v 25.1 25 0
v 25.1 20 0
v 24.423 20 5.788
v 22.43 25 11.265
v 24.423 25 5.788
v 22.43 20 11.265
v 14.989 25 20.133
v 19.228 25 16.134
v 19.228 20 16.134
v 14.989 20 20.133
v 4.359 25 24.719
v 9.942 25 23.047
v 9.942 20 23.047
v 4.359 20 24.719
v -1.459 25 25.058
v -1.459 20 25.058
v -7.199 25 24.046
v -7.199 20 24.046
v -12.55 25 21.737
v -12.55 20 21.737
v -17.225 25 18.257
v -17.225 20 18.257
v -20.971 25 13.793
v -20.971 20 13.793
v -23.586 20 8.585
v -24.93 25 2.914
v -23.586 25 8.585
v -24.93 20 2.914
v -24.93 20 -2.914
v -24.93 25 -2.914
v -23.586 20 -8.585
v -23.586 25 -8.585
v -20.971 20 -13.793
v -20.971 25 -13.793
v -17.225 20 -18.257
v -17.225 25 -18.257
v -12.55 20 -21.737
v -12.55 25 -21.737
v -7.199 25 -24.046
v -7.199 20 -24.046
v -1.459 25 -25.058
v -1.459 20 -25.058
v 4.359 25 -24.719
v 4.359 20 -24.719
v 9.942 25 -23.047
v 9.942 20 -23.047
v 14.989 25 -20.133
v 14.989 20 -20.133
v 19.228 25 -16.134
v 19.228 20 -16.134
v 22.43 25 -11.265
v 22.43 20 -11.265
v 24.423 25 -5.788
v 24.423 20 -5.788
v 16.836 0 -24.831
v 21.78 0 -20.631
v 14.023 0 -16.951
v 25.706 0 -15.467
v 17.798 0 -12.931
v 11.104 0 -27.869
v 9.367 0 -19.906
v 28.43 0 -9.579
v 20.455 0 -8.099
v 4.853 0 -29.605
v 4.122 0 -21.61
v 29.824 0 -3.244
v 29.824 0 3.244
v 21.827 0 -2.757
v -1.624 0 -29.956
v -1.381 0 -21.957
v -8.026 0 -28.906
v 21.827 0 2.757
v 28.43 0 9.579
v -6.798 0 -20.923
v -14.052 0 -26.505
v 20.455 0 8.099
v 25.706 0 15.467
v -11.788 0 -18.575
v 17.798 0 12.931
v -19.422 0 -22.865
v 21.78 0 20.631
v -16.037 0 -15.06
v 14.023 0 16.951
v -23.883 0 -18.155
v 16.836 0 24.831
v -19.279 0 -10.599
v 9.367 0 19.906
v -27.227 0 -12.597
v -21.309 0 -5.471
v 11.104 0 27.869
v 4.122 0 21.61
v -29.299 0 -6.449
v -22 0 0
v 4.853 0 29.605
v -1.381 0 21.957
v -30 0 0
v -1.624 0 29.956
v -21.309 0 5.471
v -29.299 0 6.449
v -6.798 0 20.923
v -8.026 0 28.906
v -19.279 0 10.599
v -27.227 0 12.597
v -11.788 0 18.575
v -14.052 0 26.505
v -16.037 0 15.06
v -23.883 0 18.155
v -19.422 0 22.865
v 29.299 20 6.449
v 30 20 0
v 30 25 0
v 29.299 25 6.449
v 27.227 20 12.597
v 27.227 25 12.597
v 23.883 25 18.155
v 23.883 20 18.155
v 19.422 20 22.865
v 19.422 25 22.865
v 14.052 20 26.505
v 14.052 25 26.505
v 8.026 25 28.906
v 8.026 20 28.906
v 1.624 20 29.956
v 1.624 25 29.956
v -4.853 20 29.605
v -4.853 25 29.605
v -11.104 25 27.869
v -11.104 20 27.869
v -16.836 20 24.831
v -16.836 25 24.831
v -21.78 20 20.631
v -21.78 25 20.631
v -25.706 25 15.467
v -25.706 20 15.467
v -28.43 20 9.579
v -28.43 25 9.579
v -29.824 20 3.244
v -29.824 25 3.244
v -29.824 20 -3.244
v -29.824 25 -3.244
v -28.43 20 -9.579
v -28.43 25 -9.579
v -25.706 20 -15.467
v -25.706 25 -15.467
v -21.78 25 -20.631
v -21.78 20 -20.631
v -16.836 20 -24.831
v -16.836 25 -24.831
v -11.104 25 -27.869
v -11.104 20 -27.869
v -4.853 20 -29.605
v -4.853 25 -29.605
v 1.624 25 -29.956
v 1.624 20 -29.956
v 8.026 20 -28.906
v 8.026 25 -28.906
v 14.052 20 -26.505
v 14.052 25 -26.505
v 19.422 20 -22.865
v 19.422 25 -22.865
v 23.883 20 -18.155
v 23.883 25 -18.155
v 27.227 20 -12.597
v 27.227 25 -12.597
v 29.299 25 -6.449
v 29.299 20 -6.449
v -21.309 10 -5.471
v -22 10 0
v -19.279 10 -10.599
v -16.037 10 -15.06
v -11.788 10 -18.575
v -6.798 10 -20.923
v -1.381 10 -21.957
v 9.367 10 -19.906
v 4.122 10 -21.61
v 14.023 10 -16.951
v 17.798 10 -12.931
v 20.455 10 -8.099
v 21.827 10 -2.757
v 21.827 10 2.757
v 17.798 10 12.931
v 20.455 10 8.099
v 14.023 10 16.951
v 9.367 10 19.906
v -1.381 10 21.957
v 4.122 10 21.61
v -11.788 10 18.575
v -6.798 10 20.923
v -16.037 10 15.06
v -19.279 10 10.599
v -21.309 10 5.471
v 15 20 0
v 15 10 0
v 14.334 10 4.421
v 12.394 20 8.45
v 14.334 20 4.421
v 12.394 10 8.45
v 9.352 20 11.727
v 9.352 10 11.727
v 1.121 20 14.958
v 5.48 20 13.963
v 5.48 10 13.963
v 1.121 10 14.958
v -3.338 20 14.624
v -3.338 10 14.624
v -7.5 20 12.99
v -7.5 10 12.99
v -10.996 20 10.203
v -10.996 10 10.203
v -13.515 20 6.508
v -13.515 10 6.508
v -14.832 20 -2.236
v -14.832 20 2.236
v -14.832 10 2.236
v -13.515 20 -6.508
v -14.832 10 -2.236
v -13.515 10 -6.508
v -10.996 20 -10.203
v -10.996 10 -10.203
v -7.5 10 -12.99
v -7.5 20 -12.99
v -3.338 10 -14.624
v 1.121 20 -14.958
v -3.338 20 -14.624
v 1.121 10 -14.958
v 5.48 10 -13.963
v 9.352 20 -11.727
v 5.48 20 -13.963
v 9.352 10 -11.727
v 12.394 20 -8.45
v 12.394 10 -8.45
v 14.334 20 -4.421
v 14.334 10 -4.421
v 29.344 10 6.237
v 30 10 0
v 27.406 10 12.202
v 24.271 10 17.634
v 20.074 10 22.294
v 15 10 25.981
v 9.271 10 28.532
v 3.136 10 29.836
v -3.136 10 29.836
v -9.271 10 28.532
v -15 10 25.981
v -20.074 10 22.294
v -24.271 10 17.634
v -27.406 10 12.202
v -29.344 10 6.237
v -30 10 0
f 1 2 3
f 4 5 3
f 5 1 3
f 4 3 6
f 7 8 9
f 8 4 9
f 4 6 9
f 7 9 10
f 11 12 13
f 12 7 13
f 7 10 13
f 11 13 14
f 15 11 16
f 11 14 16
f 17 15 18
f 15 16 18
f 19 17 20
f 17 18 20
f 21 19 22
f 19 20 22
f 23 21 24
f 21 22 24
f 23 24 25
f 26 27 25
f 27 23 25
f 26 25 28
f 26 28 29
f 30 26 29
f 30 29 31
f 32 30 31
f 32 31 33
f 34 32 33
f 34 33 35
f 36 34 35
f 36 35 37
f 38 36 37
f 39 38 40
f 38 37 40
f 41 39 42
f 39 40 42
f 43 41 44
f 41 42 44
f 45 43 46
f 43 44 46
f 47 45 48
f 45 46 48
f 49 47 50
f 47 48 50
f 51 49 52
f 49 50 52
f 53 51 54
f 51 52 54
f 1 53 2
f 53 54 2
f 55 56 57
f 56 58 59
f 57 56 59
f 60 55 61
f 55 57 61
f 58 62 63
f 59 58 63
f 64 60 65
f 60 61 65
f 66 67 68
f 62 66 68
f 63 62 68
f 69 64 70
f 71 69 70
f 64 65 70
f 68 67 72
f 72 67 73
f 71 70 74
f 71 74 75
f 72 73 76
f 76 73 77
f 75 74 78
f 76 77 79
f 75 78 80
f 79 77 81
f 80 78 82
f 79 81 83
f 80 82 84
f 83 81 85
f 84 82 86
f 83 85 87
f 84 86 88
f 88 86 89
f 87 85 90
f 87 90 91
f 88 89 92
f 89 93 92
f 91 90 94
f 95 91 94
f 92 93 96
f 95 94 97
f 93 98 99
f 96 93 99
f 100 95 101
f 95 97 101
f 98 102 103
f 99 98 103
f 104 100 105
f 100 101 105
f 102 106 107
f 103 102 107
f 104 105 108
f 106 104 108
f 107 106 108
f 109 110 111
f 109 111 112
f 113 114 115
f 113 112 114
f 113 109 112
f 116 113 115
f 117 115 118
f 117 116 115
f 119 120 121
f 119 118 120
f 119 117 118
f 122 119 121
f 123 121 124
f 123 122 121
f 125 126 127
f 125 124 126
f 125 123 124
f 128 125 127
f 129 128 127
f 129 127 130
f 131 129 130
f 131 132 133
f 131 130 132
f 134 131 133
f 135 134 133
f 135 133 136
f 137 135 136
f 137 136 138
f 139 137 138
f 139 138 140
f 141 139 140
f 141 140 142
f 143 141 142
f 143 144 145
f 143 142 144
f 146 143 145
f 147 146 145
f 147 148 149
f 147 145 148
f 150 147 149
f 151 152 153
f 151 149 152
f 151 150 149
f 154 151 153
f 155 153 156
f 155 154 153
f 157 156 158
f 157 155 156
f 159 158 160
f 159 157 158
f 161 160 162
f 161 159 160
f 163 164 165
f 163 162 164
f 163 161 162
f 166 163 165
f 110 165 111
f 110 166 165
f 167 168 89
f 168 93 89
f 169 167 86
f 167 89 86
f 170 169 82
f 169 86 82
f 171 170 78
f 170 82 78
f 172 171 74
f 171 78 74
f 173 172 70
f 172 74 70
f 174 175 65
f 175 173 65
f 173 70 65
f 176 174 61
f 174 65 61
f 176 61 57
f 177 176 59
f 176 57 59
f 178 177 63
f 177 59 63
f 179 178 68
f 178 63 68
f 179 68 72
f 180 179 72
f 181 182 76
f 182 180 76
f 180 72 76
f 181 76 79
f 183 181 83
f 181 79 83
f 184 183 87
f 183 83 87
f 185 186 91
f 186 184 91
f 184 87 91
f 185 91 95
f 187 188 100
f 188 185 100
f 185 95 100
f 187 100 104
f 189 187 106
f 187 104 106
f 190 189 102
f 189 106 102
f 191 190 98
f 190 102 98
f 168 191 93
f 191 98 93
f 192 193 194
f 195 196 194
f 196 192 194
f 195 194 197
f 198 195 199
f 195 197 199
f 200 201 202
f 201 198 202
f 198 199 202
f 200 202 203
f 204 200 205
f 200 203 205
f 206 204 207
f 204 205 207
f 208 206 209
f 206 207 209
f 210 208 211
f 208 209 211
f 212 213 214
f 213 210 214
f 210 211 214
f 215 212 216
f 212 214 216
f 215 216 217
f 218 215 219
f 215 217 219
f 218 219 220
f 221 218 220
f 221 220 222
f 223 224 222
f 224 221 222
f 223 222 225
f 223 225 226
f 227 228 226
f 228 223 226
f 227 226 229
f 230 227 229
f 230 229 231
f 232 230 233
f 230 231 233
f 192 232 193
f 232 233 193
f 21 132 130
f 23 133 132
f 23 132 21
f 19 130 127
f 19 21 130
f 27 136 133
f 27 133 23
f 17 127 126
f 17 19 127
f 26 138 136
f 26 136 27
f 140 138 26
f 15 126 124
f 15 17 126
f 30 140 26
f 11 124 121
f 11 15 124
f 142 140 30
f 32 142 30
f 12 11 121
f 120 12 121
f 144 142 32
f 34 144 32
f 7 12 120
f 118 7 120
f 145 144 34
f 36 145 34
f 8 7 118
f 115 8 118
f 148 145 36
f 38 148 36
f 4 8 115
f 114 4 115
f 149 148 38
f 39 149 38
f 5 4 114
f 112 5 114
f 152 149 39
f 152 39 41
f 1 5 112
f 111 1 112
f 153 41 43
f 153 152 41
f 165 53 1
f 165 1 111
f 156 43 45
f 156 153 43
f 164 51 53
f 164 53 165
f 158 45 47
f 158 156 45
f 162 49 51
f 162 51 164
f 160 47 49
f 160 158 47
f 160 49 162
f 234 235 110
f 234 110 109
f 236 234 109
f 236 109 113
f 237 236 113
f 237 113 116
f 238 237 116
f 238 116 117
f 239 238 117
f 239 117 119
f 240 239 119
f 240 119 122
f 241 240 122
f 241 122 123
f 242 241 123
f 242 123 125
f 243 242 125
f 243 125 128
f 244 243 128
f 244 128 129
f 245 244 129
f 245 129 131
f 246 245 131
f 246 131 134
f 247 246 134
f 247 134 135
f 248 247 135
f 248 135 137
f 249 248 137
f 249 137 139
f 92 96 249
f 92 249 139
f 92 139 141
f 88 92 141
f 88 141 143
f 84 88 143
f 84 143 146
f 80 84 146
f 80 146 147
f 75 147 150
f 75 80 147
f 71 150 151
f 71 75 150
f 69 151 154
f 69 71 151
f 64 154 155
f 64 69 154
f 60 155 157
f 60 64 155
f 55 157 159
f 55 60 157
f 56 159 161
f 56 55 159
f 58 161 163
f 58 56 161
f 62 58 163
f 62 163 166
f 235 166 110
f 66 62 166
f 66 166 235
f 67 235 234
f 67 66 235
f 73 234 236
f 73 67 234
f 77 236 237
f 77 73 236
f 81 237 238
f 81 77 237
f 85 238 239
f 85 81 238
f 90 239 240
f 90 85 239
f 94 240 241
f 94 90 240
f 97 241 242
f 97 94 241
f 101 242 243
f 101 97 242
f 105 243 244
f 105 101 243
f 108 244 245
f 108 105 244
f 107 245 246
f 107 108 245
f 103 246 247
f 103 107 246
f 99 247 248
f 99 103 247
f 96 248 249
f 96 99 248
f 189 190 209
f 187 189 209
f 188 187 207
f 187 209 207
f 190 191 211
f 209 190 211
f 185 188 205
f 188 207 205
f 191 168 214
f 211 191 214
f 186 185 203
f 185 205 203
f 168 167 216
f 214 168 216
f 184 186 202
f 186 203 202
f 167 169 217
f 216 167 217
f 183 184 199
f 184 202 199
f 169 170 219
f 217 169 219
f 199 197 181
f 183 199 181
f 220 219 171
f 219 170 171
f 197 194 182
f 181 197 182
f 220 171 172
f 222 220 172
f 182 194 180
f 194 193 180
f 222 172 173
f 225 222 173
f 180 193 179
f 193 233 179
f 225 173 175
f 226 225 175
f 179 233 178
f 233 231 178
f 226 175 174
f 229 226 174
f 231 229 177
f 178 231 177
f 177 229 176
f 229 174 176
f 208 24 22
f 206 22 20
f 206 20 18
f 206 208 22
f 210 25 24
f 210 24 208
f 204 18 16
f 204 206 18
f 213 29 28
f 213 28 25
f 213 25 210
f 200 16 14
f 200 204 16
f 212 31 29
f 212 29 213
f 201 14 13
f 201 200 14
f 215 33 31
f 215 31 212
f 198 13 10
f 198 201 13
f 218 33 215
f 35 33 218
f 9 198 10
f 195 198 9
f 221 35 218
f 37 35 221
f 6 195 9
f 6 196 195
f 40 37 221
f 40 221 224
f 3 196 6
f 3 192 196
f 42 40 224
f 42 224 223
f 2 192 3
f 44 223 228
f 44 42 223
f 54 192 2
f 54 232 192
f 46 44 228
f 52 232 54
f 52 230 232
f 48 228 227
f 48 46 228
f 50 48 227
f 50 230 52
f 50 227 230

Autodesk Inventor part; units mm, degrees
ref_plane "YZ Plane" through (0, 0, 0) normal (1, 0, 0) x (0, 1, 0)
ref_plane "XZ Plane" through (0, 0, 0) normal (0, 1, 0) x (-1, 0, 0)
ref_plane "XY Plane" through (0, 0, 0) normal (0, 0, 1) x (1, 0, 0)
sketch "Sketch2" plane through (0, 0, 0) normal (0, 1, 0) x (-1, 0, 0)
  circle A0 centre (0, 0) radius 22
  circle A1 centre (0, 0) radius 30
  dimension "d0" = 44
  dimension "d1" = 60
extrude "Extrusion1" add sketch "Sketch2" along normal blind 10
sketch "Sketch3" plane through (0, 10, 0) normal (0, 1, 0) x (1, 0, 0)
  circle A0 centre (0, 0) radius 30 projected
  circle A1 centre (0, 0) radius 15
  dimension "d4" = 30
extrude "Extrusion2" add sketch "Sketch3" along normal blind 10
sketch "Sketch4" plane through (0, 20, 0) normal (0, 1, 0) x (1, 0, 0)
  circle A0 centre (0, 0) radius 25.1
  circle A1 centre (0, 0) radius 30
  dimension "d7" = 60
  dimension "d8" = 50.2
extrude "Extrusion3" add sketch "Sketch4" along normal blind 5
properties part number "smallbearingcup" material "Steel"
